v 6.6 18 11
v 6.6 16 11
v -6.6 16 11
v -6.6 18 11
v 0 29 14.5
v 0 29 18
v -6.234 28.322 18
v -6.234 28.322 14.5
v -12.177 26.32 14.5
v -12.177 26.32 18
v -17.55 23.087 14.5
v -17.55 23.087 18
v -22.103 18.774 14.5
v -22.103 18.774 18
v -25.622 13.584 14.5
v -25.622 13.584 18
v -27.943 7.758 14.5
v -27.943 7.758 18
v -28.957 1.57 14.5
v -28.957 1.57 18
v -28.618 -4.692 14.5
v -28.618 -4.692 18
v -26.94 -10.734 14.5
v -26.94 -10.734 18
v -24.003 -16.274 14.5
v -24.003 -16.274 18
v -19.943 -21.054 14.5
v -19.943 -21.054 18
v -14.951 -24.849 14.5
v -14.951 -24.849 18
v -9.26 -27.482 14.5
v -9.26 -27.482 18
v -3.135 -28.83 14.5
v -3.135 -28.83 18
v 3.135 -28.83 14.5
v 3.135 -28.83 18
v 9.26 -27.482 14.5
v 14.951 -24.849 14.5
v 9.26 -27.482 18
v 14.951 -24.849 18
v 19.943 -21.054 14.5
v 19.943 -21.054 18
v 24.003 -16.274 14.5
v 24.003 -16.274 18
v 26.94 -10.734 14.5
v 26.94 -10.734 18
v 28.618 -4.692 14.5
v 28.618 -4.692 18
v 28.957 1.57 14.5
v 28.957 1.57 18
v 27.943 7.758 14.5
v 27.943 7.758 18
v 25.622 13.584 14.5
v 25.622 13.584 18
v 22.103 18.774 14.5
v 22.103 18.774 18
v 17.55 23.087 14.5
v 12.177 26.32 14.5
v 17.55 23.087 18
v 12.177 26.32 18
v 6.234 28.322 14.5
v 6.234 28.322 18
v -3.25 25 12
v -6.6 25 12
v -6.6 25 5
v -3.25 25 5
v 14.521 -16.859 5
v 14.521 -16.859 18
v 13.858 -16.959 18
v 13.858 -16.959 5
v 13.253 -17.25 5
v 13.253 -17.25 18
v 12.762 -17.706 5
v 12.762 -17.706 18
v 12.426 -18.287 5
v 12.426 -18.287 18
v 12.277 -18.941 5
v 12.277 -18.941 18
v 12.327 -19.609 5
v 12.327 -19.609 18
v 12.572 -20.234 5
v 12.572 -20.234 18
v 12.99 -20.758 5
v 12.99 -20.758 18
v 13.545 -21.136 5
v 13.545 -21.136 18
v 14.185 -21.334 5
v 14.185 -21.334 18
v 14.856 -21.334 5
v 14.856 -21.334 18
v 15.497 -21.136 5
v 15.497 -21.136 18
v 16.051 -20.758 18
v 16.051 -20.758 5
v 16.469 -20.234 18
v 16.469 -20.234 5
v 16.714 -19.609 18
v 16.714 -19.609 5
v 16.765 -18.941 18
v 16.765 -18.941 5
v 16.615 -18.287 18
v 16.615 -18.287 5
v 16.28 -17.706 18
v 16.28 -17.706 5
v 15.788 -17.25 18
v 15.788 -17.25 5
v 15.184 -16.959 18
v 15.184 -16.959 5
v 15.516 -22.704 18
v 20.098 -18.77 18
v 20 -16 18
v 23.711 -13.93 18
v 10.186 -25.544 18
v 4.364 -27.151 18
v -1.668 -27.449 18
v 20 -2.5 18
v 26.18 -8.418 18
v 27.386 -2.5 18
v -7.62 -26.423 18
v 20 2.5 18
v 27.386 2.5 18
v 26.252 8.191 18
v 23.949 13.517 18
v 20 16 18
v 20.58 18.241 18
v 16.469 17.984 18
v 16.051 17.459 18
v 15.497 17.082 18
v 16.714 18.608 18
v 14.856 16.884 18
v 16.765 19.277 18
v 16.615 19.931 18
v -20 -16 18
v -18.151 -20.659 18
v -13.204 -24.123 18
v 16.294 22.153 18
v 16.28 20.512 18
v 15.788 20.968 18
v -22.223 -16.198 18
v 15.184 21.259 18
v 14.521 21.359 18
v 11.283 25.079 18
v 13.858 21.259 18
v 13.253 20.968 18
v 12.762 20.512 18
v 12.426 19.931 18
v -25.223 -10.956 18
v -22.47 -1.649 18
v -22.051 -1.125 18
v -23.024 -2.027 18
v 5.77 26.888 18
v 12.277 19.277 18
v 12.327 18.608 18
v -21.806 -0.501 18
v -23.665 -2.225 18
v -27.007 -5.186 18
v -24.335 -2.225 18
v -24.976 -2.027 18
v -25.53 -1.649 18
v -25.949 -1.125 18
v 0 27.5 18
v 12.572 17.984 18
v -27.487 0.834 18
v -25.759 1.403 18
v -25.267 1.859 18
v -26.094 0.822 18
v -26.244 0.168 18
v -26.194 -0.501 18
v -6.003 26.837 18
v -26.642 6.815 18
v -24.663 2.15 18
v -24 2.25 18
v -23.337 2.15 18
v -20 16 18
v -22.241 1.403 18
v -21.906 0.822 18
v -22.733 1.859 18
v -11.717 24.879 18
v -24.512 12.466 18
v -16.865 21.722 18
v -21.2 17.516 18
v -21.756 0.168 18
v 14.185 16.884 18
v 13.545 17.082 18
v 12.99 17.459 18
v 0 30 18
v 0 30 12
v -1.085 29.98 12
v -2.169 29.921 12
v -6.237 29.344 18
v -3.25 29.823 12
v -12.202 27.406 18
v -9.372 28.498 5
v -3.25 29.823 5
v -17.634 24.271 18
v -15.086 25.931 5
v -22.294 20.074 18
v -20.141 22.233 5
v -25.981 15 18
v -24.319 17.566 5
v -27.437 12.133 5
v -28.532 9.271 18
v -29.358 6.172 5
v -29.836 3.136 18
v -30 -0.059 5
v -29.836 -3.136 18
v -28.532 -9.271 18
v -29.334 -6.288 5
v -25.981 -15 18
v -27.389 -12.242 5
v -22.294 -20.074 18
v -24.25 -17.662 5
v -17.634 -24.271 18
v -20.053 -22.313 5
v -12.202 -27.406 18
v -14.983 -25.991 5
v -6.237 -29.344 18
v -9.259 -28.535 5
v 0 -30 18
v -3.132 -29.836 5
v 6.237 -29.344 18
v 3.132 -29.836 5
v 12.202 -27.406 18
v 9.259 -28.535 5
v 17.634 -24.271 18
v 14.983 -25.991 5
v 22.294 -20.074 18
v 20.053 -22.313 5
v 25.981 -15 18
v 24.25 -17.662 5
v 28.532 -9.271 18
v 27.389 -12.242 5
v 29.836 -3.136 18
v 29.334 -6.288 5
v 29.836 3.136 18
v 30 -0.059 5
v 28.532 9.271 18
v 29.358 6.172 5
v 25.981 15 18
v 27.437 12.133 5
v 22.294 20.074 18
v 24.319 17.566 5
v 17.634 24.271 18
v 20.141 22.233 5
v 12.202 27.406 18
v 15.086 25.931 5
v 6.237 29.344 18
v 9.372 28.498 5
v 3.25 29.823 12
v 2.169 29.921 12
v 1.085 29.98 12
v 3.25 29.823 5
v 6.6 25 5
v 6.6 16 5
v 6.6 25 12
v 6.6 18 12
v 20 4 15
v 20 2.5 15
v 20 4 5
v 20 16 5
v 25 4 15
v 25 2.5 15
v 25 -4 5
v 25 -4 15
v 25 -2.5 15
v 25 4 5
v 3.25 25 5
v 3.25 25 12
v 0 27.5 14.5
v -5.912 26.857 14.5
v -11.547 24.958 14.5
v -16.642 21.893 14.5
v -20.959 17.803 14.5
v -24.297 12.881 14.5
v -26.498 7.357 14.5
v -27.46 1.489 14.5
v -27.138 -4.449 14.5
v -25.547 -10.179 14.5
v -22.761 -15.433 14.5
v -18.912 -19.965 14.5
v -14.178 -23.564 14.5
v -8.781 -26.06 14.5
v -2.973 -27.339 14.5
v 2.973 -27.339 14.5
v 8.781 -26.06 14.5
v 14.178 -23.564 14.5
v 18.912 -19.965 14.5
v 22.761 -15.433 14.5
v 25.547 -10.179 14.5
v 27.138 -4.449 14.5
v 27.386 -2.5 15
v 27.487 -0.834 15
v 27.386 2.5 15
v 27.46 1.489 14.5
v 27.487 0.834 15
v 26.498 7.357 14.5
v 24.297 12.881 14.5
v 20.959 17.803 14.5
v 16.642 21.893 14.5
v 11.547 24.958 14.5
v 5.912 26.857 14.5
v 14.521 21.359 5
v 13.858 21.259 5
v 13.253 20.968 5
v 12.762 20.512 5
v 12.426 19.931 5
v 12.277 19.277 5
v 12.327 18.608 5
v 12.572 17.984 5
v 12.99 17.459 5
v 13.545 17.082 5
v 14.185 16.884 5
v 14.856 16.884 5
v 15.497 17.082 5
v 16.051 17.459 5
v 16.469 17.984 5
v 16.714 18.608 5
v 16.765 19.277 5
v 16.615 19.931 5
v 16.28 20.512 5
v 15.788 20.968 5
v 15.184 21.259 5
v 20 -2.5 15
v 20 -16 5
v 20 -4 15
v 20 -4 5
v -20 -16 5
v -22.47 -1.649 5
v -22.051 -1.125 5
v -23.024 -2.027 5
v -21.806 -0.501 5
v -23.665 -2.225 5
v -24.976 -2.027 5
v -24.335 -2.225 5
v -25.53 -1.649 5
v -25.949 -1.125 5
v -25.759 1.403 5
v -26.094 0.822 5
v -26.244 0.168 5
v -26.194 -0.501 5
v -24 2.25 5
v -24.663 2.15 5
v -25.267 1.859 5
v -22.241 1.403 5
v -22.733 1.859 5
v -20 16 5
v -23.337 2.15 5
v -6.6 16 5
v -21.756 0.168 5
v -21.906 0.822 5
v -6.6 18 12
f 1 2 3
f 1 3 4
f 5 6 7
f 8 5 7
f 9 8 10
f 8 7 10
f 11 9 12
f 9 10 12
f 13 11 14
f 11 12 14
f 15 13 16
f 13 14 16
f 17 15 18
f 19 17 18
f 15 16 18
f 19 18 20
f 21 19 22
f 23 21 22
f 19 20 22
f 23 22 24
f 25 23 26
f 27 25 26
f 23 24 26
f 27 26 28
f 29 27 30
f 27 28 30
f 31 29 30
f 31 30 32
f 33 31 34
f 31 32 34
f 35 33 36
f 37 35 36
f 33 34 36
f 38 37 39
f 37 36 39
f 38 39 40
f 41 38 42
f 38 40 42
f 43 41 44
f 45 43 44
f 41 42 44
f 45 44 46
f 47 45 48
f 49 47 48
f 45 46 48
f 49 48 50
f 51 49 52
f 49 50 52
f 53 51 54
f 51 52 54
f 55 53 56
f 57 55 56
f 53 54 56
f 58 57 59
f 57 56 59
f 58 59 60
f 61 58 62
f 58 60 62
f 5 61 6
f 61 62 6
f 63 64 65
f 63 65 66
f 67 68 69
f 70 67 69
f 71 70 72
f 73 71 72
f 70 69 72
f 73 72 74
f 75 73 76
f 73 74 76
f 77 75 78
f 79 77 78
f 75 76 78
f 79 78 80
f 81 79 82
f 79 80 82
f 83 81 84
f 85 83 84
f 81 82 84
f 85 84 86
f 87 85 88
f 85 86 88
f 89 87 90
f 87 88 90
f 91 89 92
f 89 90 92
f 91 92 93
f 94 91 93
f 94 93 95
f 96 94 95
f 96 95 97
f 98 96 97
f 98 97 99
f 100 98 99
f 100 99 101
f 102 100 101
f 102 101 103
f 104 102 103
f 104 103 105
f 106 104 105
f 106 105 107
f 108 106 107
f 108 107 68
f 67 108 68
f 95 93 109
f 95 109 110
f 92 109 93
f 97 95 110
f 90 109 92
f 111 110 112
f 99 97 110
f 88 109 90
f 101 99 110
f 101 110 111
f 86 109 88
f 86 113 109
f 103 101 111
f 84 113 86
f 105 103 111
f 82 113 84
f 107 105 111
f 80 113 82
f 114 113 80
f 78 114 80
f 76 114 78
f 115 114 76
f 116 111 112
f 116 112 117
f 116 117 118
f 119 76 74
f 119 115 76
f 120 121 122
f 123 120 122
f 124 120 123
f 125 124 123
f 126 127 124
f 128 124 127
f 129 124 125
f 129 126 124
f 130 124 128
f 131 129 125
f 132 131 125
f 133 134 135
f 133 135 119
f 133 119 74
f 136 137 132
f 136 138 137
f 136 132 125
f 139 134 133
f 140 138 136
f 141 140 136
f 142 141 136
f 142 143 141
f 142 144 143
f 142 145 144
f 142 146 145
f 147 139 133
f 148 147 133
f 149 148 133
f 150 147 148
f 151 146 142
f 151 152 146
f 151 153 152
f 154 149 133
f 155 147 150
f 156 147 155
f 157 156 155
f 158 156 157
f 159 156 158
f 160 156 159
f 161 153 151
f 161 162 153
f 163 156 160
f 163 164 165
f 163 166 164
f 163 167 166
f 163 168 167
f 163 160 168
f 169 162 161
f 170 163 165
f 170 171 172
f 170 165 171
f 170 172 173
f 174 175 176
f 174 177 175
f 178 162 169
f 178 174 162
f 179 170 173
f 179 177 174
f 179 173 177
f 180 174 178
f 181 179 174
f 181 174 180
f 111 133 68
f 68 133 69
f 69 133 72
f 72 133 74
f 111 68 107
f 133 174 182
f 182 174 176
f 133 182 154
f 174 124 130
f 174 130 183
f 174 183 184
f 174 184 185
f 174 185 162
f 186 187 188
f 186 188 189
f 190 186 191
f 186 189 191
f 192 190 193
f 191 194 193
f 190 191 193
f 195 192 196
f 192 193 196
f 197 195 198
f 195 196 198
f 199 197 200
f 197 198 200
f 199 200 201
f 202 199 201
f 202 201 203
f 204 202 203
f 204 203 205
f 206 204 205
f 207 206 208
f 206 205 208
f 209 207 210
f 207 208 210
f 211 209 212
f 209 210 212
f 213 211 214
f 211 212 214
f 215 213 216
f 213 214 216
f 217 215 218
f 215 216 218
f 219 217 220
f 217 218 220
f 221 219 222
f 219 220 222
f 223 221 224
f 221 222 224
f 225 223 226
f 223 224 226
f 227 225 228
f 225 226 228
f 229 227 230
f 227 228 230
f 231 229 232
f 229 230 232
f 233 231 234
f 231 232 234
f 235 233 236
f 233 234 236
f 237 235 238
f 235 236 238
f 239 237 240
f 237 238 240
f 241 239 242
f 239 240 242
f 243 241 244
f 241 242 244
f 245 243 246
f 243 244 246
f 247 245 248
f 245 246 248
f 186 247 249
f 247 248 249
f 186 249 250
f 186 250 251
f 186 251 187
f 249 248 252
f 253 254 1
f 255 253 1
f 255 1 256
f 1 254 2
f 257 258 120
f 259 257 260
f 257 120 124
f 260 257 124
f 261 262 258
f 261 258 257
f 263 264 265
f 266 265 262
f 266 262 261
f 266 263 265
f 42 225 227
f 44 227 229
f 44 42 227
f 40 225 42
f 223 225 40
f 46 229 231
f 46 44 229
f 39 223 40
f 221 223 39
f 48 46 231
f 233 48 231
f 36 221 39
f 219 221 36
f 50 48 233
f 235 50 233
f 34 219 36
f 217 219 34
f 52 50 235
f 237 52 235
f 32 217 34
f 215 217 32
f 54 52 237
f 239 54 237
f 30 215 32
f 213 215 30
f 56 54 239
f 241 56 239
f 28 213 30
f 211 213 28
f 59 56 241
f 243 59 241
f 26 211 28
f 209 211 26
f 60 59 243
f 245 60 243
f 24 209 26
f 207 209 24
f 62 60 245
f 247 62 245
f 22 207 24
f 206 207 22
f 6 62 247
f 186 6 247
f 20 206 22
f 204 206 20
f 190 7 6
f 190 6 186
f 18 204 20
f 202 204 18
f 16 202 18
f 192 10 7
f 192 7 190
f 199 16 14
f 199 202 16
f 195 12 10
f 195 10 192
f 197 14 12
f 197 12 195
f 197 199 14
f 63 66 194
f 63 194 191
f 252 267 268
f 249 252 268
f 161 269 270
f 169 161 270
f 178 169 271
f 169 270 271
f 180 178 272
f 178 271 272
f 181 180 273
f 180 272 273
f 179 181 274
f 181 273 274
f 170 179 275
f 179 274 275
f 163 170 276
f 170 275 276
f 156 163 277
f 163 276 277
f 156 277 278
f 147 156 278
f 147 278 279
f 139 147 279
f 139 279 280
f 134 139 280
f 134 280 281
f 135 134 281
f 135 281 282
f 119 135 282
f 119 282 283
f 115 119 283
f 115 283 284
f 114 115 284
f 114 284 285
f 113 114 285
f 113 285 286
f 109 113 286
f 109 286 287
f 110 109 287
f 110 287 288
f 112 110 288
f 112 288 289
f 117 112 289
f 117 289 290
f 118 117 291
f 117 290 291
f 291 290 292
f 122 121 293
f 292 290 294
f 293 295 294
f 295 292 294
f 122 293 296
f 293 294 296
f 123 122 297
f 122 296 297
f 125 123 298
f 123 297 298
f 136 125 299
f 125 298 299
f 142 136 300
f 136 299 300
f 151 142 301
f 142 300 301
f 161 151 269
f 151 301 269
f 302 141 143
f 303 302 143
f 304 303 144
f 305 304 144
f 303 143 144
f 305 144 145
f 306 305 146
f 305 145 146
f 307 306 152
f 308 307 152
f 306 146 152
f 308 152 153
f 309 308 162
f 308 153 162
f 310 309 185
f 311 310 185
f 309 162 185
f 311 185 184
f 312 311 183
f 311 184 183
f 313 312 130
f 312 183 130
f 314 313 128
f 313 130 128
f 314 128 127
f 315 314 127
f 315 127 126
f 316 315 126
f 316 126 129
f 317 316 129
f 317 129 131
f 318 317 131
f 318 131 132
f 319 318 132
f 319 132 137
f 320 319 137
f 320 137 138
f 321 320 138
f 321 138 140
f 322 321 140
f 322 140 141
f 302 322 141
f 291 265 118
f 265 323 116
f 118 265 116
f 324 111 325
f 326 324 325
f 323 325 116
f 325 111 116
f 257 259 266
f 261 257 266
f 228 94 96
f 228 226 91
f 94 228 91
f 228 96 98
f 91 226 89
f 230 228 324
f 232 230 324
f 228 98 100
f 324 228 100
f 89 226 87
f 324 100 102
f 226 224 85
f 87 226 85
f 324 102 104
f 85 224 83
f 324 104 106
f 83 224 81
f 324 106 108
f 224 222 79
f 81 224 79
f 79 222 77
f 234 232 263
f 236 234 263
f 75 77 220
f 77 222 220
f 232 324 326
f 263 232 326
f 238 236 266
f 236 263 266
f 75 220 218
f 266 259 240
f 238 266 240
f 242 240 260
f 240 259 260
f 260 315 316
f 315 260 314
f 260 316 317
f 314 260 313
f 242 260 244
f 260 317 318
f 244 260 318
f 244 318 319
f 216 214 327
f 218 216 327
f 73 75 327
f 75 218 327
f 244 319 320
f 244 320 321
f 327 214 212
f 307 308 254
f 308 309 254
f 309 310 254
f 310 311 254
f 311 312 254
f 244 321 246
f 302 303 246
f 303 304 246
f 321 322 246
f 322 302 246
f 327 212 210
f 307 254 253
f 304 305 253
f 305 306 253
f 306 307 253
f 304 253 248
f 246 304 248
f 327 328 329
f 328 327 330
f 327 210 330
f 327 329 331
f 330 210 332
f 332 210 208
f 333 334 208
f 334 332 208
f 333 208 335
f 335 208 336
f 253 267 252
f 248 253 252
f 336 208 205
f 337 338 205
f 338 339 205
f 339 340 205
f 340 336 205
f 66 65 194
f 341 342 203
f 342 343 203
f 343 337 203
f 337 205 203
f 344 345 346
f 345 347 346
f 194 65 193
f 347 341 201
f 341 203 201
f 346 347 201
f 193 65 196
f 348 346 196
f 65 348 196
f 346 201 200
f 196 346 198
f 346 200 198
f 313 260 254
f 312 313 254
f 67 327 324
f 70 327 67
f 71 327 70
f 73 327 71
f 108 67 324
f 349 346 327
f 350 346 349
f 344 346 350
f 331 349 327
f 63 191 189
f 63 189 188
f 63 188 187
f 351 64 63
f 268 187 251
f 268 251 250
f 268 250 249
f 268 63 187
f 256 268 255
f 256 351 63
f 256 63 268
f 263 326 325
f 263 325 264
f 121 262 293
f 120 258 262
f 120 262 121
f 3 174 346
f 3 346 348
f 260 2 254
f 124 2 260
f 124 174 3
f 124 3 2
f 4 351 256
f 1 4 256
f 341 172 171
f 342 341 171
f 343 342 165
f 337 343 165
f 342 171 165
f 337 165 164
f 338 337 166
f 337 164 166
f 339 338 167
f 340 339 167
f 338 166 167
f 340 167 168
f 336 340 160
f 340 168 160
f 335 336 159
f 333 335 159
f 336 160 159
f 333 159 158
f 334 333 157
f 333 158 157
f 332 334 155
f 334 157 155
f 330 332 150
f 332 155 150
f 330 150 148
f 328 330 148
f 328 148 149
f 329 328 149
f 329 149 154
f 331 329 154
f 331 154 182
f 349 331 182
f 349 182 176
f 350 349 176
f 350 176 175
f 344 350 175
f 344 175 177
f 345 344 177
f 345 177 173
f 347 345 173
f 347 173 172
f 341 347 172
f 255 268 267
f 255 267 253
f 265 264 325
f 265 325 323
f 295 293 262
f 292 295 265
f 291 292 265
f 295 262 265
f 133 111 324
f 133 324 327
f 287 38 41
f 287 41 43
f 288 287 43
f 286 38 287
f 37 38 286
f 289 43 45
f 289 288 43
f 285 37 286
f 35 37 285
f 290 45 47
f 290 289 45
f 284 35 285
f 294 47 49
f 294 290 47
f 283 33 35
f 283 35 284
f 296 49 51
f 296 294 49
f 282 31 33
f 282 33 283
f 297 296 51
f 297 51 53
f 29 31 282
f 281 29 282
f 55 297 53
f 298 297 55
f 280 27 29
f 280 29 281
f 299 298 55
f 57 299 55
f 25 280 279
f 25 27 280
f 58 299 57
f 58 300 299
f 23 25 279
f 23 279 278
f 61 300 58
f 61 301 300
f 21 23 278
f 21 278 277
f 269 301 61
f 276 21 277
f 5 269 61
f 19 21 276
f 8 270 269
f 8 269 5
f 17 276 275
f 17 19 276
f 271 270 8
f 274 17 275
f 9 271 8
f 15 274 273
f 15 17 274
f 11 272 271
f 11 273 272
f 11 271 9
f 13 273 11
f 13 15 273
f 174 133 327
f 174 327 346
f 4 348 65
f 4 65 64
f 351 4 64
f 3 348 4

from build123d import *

# Parameters (mm, degrees)
SKETCH027_R             = 30
PAD006_DEPTH            = 13
SKETCH028_R             = 29
POCKET018_DEPTH         = 3.5
SKETCH029_R             = 27.5
PAD007_DEPTH            = 3.5
SKETCH031_W             = 32
SKETCH031_H             = 40
POCKET020_DEPTH         = 13
SKETCH032_W             = 5
SKETCH032_H             = 3
POCKET021_DEPTH         = 8
SKETCH033_R             = 2.25
POCKET022_DEPTH         = 20
SKETCH034_W             = 8
SKETCH034_H             = 5
POCKET023_DEPTH         = 10
SKETCH035_W             = 13.2
SKETCH035_H             = 7
POCKET024_DEPTH         = 9
SKETCH036_W             = 6.5
SKETCH036_H             = 7
POCKET025_DEPTH         = 5
SKETCH037_W             = 2
SKETCH037_H             = 13.2
PAD008_DEPTH            = 1
BODY005_PLACEMENT_ANGLE = 90


with BuildPart() as part:
    # Sketch027 → Pad006 (new body)
    with BuildSketch(Plane.XY):
        Circle(SKETCH027_R)
    extrude(amount=PAD006_DEPTH)

    # Sketch028 (on Face3 of Pad006) → Pocket018 (cut)
    with BuildSketch(Plane.XY.offset(13)):
        Circle(SKETCH028_R)
    extrude(amount=-POCKET018_DEPTH, mode=Mode.SUBTRACT)

    # Sketch029 (on Face5 of Pocket018) → Pad007 (join)
    with BuildSketch(Plane.XY.offset(9.5)):
        Circle(SKETCH029_R)
    extrude(amount=PAD007_DEPTH)

    # Sketch031 → Pocket020 (cut)
    with BuildSketch(Plane.XY.offset(13)):
        Rectangle(SKETCH031_W, SKETCH031_H)
    extrude(amount=-POCKET020_DEPTH, mode=Mode.SUBTRACT)

    # Sketch032 (on Face5 of Pocket020) → Pocket021 (cut)
    with BuildSketch(Plane(origin=(0, -20, 0), x_dir=(-1, 0, 0), z_dir=(0, 1, 0))):
        with Locations((0, 11.5)):
            Rectangle(SKETCH032_W, SKETCH032_H)
    extrude(amount=-POCKET021_DEPTH, mode=Mode.SUBTRACT)

    # Sketch033 (on Face9 of Pocket021) → Pocket022 (cut)
    with BuildSketch(Plane.XY.offset(13)):
        with Locations((-19.108778, -14.520833)):
            Circle(SKETCH033_R)
        with Locations((0, 24)):
            Circle(SKETCH033_R)
        with Locations((19.108778, -14.520833)):
            Circle(SKETCH033_R)
    extrude(amount=-POCKET022_DEPTH, mode=Mode.SUBTRACT)

    # Sketch034 (on Face2 of Pocket022) → Pocket023 (cut)
    with BuildSketch(Plane(origin=(0, 0, 0), x_dir=(1, 0, 0), z_dir=(0, 0, -1))):
        with Locations((0, 22.5)):
            Rectangle(SKETCH034_W, SKETCH034_H)
    extrude(amount=-POCKET023_DEPTH, mode=Mode.SUBTRACT)

    # Sketch035 (on Face10 of Pocket023) → Pocket024 (cut)
    with BuildSketch(Plane(origin=(16, 0, 0), x_dir=(0, -1, 0), z_dir=(-1, 0, 0))):
        with Locations((0, 3.5)):
            Rectangle(SKETCH035_W, SKETCH035_H)
    extrude(amount=-POCKET024_DEPTH, mode=Mode.SUBTRACT)

    # Sketch036 (on Face12 of Pocket024) → Pocket025 (cut)
    with BuildSketch(Plane(origin=(25, 0, 0), x_dir=(0, -1, 0), z_dir=(-1, 0, 0))):
        with Locations((0, 3.5)):
            Rectangle(SKETCH036_W, SKETCH036_H)
    extrude(amount=-POCKET025_DEPTH, mode=Mode.SUBTRACT)

    # Sketch037 (on Face7 of Pocket025) → Pad008 (join)
    with BuildSketch(Plane(origin=(0, 0, 7), x_dir=(1, 0, 0), z_dir=(0, 0, -1))):
        with Locations((17, 0)):
            Rectangle(SKETCH037_W, SKETCH037_H)
    extrude(amount=PAD008_DEPTH)


with BuildPart() as part_1:
    # Body005 placement: moved
    add(part.part.moved(Location((0, 0, 5))).rotate(Axis((0, 0, 5), (0, 0, 1)), BODY005_PLACEMENT_ANGLE))


solid = part_1.part
